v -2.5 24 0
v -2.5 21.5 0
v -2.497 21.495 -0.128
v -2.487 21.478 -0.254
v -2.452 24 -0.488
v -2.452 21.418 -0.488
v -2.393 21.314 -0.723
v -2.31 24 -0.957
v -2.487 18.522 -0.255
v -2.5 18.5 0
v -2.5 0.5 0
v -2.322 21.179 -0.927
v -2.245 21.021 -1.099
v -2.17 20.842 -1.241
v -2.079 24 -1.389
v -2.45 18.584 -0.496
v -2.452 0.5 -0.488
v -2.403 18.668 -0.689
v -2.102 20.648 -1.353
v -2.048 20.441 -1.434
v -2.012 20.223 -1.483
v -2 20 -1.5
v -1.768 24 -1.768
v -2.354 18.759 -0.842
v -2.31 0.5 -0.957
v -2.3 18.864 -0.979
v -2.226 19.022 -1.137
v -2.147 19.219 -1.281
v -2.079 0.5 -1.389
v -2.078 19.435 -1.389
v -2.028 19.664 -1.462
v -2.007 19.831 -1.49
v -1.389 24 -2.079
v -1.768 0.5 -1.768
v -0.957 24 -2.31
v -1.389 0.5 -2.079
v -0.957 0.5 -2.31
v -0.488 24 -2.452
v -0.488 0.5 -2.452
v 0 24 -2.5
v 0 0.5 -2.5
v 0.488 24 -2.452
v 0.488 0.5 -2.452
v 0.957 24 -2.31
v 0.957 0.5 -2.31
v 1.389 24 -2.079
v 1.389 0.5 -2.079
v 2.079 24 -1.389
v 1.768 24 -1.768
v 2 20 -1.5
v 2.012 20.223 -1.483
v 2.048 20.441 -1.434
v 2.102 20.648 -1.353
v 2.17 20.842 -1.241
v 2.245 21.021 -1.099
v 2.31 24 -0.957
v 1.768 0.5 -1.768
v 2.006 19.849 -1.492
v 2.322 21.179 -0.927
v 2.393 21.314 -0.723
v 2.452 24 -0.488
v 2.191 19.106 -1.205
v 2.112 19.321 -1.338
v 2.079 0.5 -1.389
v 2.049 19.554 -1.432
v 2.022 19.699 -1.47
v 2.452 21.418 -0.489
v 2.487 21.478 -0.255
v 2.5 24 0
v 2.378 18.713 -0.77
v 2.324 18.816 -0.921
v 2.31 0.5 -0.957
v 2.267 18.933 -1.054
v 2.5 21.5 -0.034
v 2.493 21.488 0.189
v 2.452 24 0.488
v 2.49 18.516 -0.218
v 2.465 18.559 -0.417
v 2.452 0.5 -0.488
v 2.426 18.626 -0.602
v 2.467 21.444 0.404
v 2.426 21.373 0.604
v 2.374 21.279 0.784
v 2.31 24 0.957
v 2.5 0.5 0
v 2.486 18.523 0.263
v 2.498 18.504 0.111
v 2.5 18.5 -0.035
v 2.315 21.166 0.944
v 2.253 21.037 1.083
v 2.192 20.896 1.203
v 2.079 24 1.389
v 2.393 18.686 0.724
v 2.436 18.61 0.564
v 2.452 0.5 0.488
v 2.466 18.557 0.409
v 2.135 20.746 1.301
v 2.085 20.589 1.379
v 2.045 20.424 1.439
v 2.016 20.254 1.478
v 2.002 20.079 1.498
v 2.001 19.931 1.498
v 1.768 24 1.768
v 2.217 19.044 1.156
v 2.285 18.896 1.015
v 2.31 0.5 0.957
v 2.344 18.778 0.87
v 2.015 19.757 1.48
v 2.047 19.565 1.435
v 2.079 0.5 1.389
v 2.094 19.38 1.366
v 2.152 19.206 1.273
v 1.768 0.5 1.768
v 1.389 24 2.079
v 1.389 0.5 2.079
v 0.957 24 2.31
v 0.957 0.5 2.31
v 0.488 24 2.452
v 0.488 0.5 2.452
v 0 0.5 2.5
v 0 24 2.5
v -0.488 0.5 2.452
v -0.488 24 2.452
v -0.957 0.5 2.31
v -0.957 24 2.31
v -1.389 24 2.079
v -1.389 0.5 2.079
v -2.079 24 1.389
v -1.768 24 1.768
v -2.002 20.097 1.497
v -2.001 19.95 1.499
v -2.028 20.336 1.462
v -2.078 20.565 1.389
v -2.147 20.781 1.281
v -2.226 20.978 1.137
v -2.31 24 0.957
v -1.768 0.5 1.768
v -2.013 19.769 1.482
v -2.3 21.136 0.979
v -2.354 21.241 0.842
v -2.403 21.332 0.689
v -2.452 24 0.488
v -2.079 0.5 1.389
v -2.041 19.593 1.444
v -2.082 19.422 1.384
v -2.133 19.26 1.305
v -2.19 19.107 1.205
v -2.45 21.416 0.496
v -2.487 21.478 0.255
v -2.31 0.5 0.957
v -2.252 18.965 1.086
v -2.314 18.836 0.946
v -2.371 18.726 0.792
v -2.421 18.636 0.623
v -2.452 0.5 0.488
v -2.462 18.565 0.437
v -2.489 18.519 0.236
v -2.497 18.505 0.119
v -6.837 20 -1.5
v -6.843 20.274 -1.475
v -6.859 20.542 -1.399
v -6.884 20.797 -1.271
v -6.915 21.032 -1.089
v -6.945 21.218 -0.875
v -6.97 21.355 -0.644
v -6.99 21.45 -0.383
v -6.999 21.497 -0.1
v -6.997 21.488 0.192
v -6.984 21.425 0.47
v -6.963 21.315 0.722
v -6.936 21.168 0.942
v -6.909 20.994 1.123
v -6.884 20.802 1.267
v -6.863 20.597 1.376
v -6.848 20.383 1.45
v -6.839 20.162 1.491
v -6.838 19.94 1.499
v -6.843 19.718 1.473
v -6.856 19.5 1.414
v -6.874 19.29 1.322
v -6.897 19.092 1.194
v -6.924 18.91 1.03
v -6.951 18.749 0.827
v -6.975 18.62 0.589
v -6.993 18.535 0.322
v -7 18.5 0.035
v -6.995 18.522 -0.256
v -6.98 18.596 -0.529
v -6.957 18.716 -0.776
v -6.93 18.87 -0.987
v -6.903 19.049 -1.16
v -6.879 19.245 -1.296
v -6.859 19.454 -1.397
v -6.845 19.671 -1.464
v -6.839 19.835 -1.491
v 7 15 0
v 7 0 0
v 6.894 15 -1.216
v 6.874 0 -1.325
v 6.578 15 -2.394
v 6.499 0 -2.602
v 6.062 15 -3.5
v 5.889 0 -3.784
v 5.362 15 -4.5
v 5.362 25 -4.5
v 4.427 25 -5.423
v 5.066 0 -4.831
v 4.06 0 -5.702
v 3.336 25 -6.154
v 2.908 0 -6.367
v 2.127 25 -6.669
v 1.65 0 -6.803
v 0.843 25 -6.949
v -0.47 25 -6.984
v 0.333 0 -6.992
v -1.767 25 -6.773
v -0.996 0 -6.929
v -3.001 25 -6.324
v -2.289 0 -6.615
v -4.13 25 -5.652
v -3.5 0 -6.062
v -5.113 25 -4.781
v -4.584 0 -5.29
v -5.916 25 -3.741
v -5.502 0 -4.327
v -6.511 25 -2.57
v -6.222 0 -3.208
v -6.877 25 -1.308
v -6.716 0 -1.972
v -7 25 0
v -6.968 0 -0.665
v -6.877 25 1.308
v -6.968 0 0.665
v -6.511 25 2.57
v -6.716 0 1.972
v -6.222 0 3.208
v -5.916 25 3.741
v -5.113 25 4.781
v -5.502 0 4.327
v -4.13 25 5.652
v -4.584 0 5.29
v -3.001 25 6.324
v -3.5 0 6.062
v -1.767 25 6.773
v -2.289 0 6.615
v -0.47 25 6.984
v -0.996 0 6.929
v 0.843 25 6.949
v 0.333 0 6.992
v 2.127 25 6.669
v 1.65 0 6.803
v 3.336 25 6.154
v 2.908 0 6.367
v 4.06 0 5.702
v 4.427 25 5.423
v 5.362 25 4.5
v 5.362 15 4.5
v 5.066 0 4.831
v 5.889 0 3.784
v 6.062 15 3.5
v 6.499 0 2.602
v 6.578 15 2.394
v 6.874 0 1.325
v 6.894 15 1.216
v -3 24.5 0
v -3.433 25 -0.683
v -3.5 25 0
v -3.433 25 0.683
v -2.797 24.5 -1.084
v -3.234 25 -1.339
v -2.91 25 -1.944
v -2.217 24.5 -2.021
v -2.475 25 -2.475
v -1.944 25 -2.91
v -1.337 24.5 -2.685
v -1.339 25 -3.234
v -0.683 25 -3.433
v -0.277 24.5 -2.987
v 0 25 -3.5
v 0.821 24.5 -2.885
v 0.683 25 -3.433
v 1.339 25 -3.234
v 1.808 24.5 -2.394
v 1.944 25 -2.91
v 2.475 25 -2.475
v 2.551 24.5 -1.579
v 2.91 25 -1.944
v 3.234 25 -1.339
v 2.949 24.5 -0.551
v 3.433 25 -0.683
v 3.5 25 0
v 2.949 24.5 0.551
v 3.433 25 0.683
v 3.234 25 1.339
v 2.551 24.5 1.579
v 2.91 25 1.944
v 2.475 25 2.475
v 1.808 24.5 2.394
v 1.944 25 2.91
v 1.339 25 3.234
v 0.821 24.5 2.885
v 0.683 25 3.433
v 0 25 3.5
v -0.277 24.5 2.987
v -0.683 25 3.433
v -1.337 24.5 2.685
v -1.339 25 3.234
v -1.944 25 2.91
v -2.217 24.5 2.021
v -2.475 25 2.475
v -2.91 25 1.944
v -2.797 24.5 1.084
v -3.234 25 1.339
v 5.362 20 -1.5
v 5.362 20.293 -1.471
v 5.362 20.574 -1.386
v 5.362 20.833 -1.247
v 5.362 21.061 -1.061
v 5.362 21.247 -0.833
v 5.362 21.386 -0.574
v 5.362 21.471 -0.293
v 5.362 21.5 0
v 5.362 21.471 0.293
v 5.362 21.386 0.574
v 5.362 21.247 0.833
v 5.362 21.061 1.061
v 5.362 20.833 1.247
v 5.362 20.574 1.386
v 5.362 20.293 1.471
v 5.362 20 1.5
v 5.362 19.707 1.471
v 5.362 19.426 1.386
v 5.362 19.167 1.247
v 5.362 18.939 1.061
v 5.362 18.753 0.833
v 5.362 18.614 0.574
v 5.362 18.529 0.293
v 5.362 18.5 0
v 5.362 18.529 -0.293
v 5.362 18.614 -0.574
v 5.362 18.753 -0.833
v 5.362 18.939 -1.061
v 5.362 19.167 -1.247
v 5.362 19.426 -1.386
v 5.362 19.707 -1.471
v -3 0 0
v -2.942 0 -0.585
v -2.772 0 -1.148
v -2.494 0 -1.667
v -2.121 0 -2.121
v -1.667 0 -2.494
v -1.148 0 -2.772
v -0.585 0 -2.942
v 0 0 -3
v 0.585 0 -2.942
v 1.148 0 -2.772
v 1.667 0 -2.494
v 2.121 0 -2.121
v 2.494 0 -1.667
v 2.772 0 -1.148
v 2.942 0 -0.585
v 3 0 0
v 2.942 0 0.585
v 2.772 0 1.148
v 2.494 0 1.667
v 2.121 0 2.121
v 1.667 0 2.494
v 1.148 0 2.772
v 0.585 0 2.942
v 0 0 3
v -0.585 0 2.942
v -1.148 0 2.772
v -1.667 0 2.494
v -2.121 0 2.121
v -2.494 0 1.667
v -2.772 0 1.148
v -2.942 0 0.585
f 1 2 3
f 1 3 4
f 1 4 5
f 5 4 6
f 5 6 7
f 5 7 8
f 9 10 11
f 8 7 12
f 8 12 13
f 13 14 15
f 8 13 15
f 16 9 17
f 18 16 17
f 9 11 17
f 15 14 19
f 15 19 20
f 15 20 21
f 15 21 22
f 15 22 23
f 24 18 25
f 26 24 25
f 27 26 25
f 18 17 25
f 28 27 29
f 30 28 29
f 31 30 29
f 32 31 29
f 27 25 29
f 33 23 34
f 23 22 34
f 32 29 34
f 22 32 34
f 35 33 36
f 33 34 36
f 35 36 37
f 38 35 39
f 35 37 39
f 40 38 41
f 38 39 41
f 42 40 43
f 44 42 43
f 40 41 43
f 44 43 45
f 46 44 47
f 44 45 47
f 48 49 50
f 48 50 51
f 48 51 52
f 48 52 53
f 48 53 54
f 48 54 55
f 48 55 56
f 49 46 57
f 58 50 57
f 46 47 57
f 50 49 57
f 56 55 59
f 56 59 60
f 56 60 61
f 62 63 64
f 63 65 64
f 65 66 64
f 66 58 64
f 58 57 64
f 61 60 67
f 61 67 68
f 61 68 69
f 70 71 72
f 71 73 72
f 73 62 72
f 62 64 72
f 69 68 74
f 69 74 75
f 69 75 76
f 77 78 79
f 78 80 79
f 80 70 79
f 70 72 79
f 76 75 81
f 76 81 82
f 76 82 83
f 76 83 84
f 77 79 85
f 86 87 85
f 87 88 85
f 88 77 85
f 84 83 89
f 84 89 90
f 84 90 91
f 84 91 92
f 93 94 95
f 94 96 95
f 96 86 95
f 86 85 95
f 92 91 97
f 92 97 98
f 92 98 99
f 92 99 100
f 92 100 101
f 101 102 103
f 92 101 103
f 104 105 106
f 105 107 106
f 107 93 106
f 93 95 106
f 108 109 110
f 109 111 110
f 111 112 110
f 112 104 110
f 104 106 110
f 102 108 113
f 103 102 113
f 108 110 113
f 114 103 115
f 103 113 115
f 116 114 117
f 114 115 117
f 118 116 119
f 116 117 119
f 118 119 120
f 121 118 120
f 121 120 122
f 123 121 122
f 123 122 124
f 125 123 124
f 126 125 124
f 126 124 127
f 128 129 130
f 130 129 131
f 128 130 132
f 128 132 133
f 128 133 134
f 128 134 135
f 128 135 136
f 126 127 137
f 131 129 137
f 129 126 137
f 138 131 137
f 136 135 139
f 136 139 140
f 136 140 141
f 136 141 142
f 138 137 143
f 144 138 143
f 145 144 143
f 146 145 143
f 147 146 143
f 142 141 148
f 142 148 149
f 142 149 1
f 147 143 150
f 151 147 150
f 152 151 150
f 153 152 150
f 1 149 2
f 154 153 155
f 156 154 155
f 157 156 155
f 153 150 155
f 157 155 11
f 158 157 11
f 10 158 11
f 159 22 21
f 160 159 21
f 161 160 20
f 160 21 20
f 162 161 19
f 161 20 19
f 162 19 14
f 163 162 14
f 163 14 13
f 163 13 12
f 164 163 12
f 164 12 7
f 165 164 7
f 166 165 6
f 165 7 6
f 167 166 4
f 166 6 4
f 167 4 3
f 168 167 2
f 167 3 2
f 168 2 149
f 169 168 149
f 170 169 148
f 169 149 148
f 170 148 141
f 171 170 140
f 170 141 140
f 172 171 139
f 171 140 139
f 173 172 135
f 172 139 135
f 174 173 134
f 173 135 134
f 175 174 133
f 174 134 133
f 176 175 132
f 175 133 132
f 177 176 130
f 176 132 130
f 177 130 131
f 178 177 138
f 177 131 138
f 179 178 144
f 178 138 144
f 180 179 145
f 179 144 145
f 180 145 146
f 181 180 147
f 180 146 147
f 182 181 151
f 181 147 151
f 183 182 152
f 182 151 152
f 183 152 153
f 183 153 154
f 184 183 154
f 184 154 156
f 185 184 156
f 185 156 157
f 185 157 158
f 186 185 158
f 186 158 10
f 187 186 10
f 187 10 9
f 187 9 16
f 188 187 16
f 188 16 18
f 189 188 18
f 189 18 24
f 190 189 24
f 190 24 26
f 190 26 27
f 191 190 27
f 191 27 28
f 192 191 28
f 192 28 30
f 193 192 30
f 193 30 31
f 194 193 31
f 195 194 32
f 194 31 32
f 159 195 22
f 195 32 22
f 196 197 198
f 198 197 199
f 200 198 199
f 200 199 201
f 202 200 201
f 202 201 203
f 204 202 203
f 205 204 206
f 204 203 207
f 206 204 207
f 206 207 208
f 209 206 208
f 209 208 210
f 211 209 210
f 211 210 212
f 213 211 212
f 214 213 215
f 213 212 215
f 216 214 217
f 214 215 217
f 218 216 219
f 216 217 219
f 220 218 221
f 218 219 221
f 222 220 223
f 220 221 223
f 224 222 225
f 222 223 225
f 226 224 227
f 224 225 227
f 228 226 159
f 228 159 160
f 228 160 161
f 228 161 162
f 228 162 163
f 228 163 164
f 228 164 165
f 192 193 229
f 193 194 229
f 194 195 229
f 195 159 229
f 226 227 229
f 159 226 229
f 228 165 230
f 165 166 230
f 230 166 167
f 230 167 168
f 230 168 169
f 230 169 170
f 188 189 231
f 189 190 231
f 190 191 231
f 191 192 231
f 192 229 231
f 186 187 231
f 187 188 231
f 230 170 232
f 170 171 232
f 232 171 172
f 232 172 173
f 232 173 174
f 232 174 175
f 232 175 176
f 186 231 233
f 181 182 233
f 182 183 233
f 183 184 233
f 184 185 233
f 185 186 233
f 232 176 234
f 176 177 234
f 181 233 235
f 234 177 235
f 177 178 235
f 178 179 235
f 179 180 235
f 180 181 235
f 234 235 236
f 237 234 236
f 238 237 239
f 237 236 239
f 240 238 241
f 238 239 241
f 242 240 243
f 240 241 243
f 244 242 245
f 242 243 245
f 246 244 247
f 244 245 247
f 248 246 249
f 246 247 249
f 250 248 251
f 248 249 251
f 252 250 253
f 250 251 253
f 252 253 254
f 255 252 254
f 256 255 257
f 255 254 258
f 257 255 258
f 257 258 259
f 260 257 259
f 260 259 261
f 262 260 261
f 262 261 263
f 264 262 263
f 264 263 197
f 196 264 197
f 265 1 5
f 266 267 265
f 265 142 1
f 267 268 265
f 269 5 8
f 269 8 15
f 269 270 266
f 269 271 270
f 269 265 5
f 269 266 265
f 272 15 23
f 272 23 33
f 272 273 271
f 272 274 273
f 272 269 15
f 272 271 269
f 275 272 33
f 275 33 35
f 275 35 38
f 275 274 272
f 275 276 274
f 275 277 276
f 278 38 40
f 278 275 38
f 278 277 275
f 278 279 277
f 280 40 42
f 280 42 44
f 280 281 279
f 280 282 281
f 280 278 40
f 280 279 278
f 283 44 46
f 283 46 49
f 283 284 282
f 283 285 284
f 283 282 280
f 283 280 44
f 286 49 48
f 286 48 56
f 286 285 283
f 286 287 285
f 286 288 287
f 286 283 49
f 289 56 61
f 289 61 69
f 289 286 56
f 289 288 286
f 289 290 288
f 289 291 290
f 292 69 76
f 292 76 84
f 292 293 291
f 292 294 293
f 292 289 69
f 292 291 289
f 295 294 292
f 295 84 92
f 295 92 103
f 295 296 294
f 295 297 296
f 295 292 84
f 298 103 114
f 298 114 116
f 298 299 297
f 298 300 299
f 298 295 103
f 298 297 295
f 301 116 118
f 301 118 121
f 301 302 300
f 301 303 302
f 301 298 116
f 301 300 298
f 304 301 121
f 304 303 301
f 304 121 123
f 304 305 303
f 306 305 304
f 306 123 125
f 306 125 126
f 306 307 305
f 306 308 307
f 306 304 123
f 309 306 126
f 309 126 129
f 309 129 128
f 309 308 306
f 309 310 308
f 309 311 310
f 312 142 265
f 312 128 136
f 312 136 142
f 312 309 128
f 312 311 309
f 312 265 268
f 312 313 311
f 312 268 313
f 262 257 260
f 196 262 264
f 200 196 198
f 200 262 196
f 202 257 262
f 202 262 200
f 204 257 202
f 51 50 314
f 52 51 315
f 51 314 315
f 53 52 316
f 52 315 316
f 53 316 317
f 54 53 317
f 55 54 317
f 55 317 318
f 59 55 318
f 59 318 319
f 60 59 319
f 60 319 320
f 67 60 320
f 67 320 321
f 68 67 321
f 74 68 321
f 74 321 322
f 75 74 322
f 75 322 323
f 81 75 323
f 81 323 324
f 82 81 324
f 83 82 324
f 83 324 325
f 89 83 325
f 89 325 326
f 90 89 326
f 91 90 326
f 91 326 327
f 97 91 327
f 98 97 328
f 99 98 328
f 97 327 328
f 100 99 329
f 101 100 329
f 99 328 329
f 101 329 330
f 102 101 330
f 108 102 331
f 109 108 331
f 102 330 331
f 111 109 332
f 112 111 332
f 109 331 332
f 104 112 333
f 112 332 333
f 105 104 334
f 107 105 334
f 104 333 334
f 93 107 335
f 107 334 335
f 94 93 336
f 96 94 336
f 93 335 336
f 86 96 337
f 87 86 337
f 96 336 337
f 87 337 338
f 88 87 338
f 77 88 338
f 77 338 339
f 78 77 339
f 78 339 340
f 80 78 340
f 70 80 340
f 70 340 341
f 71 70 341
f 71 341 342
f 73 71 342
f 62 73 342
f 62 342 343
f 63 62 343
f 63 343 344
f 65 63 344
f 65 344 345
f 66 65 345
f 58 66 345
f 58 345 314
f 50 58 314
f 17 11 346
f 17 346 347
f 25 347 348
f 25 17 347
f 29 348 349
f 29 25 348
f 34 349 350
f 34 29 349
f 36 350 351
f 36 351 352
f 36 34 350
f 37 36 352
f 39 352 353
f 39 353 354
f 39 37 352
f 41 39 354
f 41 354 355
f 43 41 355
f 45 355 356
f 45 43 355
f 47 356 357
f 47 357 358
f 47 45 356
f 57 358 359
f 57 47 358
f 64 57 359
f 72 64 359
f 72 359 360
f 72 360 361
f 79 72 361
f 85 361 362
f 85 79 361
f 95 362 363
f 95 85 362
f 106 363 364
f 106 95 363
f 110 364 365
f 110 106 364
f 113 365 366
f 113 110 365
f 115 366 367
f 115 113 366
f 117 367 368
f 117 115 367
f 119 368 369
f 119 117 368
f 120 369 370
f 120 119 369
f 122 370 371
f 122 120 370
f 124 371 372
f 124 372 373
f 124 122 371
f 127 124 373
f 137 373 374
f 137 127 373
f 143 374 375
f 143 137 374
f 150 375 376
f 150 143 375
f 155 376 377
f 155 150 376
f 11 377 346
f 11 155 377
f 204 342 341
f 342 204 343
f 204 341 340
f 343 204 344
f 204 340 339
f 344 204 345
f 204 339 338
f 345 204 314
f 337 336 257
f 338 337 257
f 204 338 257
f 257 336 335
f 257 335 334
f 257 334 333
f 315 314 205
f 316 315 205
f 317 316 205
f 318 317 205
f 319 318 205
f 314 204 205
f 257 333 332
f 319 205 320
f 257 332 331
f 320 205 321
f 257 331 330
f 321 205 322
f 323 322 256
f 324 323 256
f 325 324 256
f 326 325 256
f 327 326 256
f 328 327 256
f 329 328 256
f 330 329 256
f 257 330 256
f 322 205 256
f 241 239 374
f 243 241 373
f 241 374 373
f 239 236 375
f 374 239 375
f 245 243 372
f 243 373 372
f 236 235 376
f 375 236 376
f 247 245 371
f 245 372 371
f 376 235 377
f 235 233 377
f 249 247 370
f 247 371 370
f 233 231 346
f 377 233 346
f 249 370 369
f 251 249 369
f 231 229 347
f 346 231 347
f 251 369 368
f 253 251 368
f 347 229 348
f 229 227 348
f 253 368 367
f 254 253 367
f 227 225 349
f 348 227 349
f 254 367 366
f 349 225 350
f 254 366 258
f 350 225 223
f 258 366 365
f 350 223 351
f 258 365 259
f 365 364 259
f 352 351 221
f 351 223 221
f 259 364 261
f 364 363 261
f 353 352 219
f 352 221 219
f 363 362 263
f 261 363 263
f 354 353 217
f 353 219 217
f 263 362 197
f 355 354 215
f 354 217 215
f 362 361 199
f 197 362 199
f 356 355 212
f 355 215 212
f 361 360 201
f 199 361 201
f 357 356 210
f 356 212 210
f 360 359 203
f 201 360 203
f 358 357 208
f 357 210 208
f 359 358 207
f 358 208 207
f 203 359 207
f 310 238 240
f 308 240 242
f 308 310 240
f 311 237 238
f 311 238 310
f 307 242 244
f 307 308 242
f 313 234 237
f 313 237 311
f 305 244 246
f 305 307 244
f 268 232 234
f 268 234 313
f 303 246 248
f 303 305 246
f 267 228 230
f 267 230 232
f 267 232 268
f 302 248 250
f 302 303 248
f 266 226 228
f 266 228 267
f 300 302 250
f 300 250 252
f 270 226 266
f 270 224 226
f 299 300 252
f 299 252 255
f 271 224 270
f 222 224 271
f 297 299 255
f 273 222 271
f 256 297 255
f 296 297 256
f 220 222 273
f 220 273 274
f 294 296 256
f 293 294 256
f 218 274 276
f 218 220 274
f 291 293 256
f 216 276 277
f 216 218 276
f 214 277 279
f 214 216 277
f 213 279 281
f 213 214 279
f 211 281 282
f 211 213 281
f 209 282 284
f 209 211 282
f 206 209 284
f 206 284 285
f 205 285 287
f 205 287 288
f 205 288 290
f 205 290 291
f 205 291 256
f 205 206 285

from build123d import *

# Parameters (mm, degrees)
ESQUISSE1_R             = 7
BOSS_EXTRU_1_DEPTH      = 25
ENL_V_MAT_EXTRU_1_REACH = 27
ESQUISSE2_R             = 2.5
CHANFREIN1_SIZE         = 0.5
CHANFREIN2_SIZE         = 1
ENL_V_MAT_EXTRU_2_DEPTH = 10
ESQUISSE4_R             = 1.5
ENL_V_MAT_EXTRU_3_DEPTH = 13.361902647


with BuildPart() as part:
    # Esquisse1 → Boss.-Extru.1 (new body)
    with BuildSketch(Plane(origin=(0, 0, 0), x_dir=(1, 0, 0), z_dir=(0, 1, 0))):
        Circle(ESQUISSE1_R)
    extrude(amount=BOSS_EXTRU_1_DEPTH)

    # Esquisse2 → Enlèv. mat.-Extru.1 (cut, up to next)
    with BuildSketch(Plane(origin=(0, 0, 0), x_dir=(-1, 0, 0), z_dir=(0, -1, 0)), mode=Mode.PRIVATE) as enl_v_mat_extru_1_sk1:
        Circle(ESQUISSE2_R)
    enl_v_mat_extru_1_tool1 = extrude(enl_v_mat_extru_1_sk1.sketch, amount=-ENL_V_MAT_EXTRU_1_REACH, mode=Mode.PRIVATE) & part.part
    add(enl_v_mat_extru_1_tool1.solids().sort_by_distance((0, 0, 0))[0], mode=Mode.SUBTRACT)

    # Chanfrein1
    chanfrein1_edges = [part.edges().sort_by_distance(p)[0] for p in [
        (2.5, 0, 0),
    ]]
    chamfer(chanfrein1_edges, length=CHANFREIN1_SIZE)

    # Chanfrein2
    chanfrein2_edges = [part.edges().sort_by_distance(p)[0] for p in [
        (2.5, 25, 0),
    ]]
    chamfer(chanfrein2_edges, length=CHANFREIN2_SIZE)

    # Esquisse3 → Enlèv. mat.-Extru.2 (cut)
    with BuildSketch(Plane(origin=(0, 25, 0), x_dir=(1, 0, 0), z_dir=(0, 1, 0))):
        Polygon((5.361902647, 48.267833041), (5.361902647, 4.5), (5.361902647, -4.5), (5.361902647, -48.267833041), (92.897568728, -48.267833041), (92.897568728, 48.267833041), align=None)
    extrude(amount=-ENL_V_MAT_EXTRU_2_DEPTH, mode=Mode.SUBTRACT)

    # Esquisse4 → Enlèv. mat.-Extru.3 (cut, through all)
    with BuildSketch(Plane(origin=(5.361902647, 0, 0), x_dir=(0, 0, -1), z_dir=(1, 0, 0))):
        with Locations((0, 20)):
            Circle(ESQUISSE4_R)
    extrude(amount=-ENL_V_MAT_EXTRU_3_DEPTH, mode=Mode.SUBTRACT)


solid = part.part
